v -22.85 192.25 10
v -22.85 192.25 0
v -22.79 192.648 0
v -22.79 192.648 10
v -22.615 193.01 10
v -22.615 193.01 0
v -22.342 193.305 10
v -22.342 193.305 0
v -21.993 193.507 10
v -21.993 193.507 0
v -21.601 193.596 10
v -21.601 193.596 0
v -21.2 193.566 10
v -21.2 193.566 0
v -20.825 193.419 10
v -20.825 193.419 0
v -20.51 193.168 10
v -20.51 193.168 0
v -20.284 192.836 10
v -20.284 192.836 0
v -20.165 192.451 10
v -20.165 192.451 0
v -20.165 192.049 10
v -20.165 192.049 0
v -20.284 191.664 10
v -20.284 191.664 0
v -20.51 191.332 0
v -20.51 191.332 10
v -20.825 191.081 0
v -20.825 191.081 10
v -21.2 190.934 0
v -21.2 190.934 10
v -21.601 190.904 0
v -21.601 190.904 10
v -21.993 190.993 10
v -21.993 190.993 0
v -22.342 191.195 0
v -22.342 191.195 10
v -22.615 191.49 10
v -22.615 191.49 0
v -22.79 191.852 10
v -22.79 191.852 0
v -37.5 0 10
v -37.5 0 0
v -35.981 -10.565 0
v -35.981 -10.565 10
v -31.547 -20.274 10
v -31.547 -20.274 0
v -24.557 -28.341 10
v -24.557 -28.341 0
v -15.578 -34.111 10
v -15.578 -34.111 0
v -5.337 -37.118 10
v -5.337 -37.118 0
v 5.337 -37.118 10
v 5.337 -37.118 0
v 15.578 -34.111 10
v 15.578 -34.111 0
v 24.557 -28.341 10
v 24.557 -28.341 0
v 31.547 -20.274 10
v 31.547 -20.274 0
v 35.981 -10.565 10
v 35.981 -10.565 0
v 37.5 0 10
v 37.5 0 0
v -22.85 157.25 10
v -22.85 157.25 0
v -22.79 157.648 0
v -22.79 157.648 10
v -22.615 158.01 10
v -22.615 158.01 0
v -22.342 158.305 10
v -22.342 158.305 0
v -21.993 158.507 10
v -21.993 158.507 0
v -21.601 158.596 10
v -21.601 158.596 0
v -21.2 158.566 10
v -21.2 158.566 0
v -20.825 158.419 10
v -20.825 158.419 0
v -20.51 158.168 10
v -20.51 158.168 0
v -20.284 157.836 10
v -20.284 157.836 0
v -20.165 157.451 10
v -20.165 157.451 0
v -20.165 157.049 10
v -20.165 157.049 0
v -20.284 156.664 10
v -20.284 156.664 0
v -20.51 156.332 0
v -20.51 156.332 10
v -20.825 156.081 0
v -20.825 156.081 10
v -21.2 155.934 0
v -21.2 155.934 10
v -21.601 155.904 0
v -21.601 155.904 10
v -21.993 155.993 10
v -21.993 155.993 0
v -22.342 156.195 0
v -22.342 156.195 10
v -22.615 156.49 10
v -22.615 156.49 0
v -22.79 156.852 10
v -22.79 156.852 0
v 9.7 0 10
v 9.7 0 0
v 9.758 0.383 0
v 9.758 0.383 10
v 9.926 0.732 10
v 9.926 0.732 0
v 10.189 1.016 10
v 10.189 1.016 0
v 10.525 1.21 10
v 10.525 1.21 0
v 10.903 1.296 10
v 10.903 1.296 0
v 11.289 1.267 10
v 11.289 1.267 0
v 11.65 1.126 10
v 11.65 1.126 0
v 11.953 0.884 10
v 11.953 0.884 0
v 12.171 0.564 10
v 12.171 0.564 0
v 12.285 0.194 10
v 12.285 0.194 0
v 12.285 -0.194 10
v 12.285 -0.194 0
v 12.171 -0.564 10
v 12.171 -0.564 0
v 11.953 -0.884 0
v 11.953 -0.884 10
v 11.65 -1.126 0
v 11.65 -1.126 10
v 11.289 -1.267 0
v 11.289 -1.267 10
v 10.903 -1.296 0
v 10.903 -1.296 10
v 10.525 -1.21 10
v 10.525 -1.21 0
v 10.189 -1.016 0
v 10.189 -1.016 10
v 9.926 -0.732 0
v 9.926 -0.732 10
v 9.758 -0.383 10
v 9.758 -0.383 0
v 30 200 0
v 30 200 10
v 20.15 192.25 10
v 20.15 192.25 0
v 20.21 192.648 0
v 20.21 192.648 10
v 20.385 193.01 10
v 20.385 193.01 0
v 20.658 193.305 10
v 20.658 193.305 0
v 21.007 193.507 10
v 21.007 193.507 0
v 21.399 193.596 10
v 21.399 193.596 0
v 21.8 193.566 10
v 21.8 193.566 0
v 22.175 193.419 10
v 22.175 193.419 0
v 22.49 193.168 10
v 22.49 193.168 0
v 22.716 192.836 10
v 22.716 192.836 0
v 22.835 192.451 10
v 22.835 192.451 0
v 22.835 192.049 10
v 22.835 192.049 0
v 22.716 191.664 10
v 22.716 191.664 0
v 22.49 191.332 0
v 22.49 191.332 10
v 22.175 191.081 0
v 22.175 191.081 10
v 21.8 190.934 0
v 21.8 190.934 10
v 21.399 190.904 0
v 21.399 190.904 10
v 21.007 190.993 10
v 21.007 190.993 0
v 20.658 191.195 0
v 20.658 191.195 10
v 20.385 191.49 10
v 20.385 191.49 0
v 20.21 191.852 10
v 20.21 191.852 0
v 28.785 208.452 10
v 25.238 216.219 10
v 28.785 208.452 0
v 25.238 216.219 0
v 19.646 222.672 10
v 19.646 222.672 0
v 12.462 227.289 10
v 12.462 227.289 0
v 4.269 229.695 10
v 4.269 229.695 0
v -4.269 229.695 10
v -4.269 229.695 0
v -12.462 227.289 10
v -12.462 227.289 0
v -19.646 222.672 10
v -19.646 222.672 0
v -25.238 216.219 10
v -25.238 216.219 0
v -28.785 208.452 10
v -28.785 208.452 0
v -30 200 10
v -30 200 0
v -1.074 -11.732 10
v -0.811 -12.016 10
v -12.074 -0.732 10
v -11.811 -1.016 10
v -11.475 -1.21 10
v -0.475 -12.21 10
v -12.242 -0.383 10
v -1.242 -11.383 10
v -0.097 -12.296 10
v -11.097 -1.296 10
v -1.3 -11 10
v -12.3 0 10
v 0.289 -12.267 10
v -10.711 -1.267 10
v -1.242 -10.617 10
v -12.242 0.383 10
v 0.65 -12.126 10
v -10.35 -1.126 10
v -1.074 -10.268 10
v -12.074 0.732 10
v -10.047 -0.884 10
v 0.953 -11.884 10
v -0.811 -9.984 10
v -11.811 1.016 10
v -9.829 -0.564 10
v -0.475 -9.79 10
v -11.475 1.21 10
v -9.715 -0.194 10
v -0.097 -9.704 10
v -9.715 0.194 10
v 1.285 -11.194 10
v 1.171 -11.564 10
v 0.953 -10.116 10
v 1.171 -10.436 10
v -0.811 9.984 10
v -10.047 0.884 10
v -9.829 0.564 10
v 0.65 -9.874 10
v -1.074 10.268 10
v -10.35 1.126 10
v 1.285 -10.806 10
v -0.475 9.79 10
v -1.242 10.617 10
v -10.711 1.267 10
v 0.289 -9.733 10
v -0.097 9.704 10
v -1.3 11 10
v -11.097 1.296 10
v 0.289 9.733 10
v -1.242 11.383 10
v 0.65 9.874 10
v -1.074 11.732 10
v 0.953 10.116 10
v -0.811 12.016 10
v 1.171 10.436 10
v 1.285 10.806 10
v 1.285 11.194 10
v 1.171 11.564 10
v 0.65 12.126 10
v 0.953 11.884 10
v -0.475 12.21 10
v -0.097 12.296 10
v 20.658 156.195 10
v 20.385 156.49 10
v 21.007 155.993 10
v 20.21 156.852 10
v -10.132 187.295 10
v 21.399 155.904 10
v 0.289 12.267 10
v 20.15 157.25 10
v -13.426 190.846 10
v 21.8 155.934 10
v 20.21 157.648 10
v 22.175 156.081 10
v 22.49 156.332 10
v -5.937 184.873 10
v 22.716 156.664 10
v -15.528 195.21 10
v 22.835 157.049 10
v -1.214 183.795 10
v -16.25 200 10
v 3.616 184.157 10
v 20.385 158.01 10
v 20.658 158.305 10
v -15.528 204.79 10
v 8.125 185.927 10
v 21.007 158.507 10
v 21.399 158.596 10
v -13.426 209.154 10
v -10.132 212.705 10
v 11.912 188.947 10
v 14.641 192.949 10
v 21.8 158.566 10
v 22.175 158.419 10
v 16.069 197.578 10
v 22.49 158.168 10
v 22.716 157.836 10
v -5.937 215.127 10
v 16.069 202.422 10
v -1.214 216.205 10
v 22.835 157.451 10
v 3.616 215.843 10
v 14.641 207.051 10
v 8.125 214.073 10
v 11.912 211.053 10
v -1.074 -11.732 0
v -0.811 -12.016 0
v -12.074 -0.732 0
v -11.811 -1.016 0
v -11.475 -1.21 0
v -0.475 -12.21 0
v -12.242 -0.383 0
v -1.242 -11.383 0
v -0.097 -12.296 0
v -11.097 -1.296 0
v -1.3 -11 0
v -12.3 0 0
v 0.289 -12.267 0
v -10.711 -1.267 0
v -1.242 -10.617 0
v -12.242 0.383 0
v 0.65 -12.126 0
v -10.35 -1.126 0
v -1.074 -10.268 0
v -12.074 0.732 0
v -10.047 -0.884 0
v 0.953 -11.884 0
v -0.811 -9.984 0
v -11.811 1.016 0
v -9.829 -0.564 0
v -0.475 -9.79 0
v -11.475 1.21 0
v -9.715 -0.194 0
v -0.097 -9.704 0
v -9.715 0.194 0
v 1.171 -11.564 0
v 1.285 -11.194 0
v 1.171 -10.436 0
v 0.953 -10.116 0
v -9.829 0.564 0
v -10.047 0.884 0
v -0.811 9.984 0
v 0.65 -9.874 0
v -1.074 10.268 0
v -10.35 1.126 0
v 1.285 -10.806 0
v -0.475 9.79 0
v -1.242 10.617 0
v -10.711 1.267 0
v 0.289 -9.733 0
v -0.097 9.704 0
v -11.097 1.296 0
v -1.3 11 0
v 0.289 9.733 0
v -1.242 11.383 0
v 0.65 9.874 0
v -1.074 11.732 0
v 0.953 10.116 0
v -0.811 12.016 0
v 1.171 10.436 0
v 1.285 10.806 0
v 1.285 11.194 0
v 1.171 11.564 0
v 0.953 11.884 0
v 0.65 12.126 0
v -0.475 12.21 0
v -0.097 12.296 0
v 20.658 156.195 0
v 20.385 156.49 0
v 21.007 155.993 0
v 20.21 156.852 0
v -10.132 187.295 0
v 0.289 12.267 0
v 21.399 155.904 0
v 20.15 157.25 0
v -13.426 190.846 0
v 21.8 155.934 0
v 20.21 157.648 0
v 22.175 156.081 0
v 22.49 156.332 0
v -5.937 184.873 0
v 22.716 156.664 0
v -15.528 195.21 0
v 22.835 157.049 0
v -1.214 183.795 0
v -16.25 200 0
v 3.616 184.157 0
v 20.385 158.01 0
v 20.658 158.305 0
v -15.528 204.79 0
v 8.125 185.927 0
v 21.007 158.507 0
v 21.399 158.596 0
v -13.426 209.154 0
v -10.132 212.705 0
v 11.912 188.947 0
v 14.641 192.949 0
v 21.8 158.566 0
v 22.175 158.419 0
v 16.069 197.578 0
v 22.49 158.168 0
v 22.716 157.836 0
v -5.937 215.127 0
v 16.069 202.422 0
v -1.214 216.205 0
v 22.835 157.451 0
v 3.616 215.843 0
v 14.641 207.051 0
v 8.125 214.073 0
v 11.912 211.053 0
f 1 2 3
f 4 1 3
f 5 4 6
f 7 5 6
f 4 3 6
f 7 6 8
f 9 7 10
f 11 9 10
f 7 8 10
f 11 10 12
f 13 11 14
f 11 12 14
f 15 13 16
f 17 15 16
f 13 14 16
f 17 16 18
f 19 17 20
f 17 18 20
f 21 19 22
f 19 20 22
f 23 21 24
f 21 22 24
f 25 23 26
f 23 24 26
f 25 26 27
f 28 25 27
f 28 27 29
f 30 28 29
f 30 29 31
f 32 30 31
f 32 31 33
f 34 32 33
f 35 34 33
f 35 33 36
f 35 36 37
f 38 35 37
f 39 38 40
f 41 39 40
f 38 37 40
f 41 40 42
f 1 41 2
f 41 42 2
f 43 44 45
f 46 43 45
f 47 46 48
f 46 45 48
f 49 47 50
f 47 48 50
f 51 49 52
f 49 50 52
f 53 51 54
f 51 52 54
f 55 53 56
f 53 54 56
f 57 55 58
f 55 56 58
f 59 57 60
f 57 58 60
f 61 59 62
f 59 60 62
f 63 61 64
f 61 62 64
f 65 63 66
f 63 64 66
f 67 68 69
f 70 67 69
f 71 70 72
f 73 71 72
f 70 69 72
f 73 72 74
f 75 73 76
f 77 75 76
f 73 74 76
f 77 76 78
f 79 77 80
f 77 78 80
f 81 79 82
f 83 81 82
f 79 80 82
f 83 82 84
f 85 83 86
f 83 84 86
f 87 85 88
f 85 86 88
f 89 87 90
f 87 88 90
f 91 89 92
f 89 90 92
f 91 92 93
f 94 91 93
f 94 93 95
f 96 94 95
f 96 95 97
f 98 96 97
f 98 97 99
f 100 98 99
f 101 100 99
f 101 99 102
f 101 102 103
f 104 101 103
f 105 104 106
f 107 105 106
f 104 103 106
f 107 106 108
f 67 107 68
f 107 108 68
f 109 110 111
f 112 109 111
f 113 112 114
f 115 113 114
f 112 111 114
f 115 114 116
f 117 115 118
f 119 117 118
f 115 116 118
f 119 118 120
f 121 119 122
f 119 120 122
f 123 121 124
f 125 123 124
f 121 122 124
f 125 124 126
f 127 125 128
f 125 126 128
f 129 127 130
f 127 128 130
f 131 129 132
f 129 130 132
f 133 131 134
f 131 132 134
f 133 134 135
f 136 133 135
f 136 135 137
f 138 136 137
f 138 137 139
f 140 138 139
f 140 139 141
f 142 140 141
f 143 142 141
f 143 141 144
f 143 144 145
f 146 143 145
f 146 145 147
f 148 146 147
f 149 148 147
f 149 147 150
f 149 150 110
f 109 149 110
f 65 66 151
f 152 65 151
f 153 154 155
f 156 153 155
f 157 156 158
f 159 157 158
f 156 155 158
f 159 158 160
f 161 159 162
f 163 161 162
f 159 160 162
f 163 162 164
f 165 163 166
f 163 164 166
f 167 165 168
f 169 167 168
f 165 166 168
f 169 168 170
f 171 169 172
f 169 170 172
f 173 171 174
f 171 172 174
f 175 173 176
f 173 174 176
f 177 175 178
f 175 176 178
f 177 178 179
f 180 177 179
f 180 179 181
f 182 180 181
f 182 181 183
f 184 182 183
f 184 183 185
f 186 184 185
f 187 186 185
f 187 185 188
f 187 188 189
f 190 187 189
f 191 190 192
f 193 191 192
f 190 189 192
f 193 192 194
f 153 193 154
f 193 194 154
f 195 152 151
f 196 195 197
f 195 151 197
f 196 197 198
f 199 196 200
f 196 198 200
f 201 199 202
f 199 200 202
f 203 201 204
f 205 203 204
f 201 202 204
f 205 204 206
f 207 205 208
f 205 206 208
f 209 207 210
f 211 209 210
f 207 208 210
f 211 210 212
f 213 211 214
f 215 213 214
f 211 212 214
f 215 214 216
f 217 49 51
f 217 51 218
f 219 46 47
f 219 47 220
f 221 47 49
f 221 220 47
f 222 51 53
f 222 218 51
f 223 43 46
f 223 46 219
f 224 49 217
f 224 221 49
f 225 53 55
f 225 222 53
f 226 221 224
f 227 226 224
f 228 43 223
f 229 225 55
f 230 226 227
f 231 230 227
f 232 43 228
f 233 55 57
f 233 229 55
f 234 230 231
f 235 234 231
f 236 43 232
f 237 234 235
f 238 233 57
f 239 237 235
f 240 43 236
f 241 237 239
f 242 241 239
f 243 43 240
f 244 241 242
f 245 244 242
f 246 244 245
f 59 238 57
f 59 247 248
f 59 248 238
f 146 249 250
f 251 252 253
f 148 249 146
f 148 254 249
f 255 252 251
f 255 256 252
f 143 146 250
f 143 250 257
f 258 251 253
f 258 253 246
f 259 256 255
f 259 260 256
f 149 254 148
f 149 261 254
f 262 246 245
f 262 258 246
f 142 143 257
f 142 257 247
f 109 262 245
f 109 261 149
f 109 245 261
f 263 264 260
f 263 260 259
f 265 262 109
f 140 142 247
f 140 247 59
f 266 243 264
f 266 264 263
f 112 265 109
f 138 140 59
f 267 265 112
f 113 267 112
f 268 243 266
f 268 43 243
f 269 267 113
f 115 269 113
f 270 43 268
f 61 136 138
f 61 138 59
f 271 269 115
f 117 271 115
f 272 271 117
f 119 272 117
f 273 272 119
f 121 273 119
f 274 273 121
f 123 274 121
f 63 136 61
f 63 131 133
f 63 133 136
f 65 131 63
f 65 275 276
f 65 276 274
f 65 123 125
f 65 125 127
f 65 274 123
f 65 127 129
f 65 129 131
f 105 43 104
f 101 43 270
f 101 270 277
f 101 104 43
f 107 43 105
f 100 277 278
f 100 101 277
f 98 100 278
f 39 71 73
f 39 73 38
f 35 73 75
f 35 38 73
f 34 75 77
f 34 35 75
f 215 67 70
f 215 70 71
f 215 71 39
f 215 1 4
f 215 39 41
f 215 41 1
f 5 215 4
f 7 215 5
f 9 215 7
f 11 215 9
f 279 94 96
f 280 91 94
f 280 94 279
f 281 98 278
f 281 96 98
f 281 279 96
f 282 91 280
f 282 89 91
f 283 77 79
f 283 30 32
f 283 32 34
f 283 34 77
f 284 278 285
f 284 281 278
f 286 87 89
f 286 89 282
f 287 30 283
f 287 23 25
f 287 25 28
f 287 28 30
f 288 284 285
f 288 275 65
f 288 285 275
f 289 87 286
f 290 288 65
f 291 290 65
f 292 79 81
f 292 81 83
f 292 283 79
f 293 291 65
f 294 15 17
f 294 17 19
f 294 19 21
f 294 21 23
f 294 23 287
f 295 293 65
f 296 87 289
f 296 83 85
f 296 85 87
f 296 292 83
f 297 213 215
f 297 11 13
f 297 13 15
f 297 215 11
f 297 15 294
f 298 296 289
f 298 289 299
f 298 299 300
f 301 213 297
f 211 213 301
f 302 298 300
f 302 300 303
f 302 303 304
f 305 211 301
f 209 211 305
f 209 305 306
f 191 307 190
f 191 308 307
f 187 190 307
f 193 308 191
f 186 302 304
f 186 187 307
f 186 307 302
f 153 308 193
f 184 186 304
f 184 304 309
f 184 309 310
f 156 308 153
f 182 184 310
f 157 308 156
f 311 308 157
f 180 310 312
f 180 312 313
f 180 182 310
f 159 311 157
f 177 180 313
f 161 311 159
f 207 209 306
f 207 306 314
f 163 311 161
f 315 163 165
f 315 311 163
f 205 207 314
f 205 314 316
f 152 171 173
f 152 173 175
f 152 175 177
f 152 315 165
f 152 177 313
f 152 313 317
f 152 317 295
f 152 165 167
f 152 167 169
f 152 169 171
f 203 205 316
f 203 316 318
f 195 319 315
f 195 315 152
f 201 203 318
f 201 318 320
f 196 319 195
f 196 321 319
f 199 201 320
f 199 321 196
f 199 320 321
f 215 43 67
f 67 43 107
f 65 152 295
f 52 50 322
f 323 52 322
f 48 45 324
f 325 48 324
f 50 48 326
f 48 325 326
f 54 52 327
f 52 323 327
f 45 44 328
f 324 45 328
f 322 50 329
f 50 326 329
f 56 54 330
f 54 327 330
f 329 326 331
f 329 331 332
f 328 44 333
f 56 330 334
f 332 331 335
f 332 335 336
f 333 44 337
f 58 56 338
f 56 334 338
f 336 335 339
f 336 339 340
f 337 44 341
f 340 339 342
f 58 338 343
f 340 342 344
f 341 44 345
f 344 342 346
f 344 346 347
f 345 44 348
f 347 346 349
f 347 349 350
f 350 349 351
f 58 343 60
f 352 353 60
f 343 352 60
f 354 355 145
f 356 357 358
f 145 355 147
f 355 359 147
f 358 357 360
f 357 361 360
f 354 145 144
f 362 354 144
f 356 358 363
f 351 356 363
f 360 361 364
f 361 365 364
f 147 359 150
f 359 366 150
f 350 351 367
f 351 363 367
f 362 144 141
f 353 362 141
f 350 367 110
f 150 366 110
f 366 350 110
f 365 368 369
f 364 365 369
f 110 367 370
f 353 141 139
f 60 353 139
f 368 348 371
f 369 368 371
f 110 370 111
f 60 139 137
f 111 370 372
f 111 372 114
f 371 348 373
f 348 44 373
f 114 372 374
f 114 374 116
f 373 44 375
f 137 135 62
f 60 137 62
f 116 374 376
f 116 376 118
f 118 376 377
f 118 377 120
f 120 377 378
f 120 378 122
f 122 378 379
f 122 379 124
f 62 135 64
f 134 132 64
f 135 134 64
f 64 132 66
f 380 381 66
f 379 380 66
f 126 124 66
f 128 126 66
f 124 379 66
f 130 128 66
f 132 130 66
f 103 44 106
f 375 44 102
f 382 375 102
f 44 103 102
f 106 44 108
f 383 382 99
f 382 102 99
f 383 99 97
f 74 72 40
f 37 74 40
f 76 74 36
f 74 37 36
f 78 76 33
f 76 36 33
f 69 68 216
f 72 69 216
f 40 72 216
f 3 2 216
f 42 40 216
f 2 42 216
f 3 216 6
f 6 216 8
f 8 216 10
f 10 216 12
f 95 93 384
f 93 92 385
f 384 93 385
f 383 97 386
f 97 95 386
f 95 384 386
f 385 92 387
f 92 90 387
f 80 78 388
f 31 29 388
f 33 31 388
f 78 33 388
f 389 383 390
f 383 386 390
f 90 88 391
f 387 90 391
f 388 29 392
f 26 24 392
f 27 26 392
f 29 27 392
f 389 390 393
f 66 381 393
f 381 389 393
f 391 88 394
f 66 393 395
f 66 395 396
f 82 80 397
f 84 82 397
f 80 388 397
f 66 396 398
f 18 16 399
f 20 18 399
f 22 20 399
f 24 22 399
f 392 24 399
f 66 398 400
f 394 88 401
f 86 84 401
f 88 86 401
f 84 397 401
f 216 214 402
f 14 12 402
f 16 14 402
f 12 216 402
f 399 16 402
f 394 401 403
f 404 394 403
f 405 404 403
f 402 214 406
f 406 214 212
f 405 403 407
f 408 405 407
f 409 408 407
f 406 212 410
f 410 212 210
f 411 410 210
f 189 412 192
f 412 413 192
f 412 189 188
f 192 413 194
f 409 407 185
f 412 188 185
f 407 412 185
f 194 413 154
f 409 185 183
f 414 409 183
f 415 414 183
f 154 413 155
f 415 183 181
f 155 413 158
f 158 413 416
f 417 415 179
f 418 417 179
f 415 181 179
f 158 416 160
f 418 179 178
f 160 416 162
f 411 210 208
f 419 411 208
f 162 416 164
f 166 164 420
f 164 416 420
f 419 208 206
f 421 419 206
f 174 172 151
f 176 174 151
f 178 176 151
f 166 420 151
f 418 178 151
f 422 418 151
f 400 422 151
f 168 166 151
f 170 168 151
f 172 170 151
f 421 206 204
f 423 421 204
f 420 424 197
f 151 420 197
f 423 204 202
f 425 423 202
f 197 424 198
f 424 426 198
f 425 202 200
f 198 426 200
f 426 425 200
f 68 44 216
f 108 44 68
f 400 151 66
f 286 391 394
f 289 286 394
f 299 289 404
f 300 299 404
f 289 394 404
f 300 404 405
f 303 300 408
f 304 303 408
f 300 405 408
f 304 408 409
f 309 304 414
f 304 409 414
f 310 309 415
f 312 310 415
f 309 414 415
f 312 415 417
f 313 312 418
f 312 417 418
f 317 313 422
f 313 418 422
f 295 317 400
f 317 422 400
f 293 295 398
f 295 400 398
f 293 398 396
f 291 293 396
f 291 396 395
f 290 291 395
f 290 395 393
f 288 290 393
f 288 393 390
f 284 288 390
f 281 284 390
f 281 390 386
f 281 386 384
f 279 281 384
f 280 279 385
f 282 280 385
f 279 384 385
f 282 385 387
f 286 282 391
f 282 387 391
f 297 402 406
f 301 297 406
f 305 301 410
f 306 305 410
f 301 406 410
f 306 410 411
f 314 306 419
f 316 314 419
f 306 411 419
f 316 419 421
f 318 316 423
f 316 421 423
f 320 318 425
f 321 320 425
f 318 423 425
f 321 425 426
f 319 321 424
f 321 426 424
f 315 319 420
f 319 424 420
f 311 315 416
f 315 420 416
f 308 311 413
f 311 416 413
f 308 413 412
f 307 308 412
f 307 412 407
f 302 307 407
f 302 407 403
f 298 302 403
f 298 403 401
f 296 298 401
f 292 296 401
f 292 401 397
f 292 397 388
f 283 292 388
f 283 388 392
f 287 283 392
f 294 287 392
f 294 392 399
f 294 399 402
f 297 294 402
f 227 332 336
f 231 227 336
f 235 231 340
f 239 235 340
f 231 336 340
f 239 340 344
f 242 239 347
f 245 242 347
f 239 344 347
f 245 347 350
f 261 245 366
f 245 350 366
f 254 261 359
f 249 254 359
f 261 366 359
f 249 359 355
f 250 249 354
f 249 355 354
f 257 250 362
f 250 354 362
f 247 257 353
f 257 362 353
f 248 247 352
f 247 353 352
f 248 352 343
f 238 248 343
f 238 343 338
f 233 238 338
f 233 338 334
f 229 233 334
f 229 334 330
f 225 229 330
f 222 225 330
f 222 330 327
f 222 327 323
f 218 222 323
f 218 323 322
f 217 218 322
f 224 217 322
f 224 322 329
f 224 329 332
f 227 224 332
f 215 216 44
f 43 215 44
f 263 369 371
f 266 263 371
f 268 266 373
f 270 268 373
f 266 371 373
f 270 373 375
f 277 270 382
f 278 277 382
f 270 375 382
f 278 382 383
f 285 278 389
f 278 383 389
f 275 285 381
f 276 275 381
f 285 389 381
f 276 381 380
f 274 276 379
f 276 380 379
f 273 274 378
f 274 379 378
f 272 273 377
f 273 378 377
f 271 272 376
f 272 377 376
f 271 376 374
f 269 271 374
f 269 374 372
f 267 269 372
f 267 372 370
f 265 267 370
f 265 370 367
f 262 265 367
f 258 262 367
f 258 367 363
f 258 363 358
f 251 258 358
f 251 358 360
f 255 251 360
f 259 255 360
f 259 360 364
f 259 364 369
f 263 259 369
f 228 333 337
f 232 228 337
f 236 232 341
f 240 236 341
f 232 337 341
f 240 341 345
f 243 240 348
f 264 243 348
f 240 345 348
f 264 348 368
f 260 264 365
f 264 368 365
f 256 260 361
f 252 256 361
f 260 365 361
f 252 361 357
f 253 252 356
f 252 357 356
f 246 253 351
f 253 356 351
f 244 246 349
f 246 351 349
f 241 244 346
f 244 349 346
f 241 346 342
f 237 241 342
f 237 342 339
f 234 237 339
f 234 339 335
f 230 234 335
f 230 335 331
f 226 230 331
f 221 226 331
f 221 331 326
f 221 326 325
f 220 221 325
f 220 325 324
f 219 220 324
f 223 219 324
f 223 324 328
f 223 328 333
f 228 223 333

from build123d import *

# Parameters (mm, degrees)
BOSS_EXTRUDE1_DEPTH = 10
CUT_EXTRUDE4_REACH  = 12
SKETCH3_R           = 16.25
CUT_EXTRUDE5_REACH  = 12
SKETCH4_R           = 1.3
SKETCH5_R           = 1.35
CUT_EXTRUDE6_DEPTH  = 10


with BuildPart() as part:
    # Sketch1 → Boss-Extrude1 (new body)
    with BuildSketch(Plane.XY):
        with BuildLine():
            ThreePointArc((30, 200), (0, 230), (-30, 200))
            Line((-30, 200), (-37.5, 0))
            ThreePointArc((-37.5, 0), (0, -37.5), (37.5, 0))
            Line((37.5, 0), (30, 200))
        make_face()
    extrude(amount=BOSS_EXTRUDE1_DEPTH)

    # Sketch3 → Cut-Extrude4 (cut, up to next)
    with BuildSketch(Plane(origin=(0, 0, 0), x_dir=(-1, 0, 0), z_dir=(0, 0, -1)), mode=Mode.PRIVATE) as cut_extrude4_sk1:
        with Locations((0, 200)):
            Circle(SKETCH3_R)
    cut_extrude4_tool1 = extrude(cut_extrude4_sk1.sketch, amount=-CUT_EXTRUDE4_REACH, mode=Mode.PRIVATE) & part.part
    add(cut_extrude4_tool1.solids().sort_by_distance((0, 200, 0))[0], mode=Mode.SUBTRACT)

    # Sketch4 → Cut-Extrude5 (cut, up to next)
    with BuildSketch(Plane(origin=(0, 0, 0), x_dir=(-1, 0, 0), z_dir=(0, 0, -1)), mode=Mode.PRIVATE) as cut_extrude5_sk1:
        with Locations((0, 11)):
            Circle(SKETCH4_R)
    cut_extrude5_tool1 = extrude(cut_extrude5_sk1.sketch, amount=-CUT_EXTRUDE5_REACH, mode=Mode.PRIVATE) & part.part
    add(cut_extrude5_tool1.solids().sort_by_distance((0, 11, 0))[0], mode=Mode.SUBTRACT)
    # Sketch4 → Cut-Extrude5 (cut, up to next)
    with BuildSketch(Plane(origin=(0, 0, 0), x_dir=(-1, 0, 0), z_dir=(0, 0, -1)), mode=Mode.PRIVATE) as cut_extrude5_sk2:
        with Locations((11, 0)):
            Circle(SKETCH4_R)
    cut_extrude5_tool2 = extrude(cut_extrude5_sk2.sketch, amount=-CUT_EXTRUDE5_REACH, mode=Mode.PRIVATE) & part.part
    add(cut_extrude5_tool2.solids().sort_by_distance((-11, 0, 0))[0], mode=Mode.SUBTRACT)
    # Sketch4 → Cut-Extrude5 (cut, up to next)
    with BuildSketch(Plane(origin=(0, 0, 0), x_dir=(-1, 0, 0), z_dir=(0, 0, -1)), mode=Mode.PRIVATE) as cut_extrude5_sk3:
        with Locations((0, -11)):
            Circle(SKETCH4_R)
    cut_extrude5_tool3 = extrude(cut_extrude5_sk3.sketch, amount=-CUT_EXTRUDE5_REACH, mode=Mode.PRIVATE) & part.part
    add(cut_extrude5_tool3.solids().sort_by_distance((0, -11, 0))[0], mode=Mode.SUBTRACT)
    # Sketch4 → Cut-Extrude5 (cut, up to next)
    with BuildSketch(Plane(origin=(0, 0, 0), x_dir=(-1, 0, 0), z_dir=(0, 0, -1)), mode=Mode.PRIVATE) as cut_extrude5_sk4:
        with Locations((-11, 0)):
            Circle(SKETCH4_R)
    cut_extrude5_tool4 = extrude(cut_extrude5_sk4.sketch, amount=-CUT_EXTRUDE5_REACH, mode=Mode.PRIVATE) & part.part
    add(cut_extrude5_tool4.solids().sort_by_distance((11, 0, 0))[0], mode=Mode.SUBTRACT)

    # Sketch5 → Cut-Extrude6 (cut)
    with BuildSketch(Plane(origin=(0, 0, 0), x_dir=(-1, 0, 0), z_dir=(0, 0, -1))):
        with Locations((21.5, 157.25)):
            Circle(SKETCH5_R)
        with Locations((-21.5, 157.25)):
            Circle(SKETCH5_R)
        with Locations((-21.5, 192.25)):
            Circle(SKETCH5_R)
        with Locations((21.5, 192.25)):
            Circle(SKETCH5_R)
    extrude(amount=-CUT_EXTRUDE6_DEPTH, mode=Mode.SUBTRACT)


solid = part.part
